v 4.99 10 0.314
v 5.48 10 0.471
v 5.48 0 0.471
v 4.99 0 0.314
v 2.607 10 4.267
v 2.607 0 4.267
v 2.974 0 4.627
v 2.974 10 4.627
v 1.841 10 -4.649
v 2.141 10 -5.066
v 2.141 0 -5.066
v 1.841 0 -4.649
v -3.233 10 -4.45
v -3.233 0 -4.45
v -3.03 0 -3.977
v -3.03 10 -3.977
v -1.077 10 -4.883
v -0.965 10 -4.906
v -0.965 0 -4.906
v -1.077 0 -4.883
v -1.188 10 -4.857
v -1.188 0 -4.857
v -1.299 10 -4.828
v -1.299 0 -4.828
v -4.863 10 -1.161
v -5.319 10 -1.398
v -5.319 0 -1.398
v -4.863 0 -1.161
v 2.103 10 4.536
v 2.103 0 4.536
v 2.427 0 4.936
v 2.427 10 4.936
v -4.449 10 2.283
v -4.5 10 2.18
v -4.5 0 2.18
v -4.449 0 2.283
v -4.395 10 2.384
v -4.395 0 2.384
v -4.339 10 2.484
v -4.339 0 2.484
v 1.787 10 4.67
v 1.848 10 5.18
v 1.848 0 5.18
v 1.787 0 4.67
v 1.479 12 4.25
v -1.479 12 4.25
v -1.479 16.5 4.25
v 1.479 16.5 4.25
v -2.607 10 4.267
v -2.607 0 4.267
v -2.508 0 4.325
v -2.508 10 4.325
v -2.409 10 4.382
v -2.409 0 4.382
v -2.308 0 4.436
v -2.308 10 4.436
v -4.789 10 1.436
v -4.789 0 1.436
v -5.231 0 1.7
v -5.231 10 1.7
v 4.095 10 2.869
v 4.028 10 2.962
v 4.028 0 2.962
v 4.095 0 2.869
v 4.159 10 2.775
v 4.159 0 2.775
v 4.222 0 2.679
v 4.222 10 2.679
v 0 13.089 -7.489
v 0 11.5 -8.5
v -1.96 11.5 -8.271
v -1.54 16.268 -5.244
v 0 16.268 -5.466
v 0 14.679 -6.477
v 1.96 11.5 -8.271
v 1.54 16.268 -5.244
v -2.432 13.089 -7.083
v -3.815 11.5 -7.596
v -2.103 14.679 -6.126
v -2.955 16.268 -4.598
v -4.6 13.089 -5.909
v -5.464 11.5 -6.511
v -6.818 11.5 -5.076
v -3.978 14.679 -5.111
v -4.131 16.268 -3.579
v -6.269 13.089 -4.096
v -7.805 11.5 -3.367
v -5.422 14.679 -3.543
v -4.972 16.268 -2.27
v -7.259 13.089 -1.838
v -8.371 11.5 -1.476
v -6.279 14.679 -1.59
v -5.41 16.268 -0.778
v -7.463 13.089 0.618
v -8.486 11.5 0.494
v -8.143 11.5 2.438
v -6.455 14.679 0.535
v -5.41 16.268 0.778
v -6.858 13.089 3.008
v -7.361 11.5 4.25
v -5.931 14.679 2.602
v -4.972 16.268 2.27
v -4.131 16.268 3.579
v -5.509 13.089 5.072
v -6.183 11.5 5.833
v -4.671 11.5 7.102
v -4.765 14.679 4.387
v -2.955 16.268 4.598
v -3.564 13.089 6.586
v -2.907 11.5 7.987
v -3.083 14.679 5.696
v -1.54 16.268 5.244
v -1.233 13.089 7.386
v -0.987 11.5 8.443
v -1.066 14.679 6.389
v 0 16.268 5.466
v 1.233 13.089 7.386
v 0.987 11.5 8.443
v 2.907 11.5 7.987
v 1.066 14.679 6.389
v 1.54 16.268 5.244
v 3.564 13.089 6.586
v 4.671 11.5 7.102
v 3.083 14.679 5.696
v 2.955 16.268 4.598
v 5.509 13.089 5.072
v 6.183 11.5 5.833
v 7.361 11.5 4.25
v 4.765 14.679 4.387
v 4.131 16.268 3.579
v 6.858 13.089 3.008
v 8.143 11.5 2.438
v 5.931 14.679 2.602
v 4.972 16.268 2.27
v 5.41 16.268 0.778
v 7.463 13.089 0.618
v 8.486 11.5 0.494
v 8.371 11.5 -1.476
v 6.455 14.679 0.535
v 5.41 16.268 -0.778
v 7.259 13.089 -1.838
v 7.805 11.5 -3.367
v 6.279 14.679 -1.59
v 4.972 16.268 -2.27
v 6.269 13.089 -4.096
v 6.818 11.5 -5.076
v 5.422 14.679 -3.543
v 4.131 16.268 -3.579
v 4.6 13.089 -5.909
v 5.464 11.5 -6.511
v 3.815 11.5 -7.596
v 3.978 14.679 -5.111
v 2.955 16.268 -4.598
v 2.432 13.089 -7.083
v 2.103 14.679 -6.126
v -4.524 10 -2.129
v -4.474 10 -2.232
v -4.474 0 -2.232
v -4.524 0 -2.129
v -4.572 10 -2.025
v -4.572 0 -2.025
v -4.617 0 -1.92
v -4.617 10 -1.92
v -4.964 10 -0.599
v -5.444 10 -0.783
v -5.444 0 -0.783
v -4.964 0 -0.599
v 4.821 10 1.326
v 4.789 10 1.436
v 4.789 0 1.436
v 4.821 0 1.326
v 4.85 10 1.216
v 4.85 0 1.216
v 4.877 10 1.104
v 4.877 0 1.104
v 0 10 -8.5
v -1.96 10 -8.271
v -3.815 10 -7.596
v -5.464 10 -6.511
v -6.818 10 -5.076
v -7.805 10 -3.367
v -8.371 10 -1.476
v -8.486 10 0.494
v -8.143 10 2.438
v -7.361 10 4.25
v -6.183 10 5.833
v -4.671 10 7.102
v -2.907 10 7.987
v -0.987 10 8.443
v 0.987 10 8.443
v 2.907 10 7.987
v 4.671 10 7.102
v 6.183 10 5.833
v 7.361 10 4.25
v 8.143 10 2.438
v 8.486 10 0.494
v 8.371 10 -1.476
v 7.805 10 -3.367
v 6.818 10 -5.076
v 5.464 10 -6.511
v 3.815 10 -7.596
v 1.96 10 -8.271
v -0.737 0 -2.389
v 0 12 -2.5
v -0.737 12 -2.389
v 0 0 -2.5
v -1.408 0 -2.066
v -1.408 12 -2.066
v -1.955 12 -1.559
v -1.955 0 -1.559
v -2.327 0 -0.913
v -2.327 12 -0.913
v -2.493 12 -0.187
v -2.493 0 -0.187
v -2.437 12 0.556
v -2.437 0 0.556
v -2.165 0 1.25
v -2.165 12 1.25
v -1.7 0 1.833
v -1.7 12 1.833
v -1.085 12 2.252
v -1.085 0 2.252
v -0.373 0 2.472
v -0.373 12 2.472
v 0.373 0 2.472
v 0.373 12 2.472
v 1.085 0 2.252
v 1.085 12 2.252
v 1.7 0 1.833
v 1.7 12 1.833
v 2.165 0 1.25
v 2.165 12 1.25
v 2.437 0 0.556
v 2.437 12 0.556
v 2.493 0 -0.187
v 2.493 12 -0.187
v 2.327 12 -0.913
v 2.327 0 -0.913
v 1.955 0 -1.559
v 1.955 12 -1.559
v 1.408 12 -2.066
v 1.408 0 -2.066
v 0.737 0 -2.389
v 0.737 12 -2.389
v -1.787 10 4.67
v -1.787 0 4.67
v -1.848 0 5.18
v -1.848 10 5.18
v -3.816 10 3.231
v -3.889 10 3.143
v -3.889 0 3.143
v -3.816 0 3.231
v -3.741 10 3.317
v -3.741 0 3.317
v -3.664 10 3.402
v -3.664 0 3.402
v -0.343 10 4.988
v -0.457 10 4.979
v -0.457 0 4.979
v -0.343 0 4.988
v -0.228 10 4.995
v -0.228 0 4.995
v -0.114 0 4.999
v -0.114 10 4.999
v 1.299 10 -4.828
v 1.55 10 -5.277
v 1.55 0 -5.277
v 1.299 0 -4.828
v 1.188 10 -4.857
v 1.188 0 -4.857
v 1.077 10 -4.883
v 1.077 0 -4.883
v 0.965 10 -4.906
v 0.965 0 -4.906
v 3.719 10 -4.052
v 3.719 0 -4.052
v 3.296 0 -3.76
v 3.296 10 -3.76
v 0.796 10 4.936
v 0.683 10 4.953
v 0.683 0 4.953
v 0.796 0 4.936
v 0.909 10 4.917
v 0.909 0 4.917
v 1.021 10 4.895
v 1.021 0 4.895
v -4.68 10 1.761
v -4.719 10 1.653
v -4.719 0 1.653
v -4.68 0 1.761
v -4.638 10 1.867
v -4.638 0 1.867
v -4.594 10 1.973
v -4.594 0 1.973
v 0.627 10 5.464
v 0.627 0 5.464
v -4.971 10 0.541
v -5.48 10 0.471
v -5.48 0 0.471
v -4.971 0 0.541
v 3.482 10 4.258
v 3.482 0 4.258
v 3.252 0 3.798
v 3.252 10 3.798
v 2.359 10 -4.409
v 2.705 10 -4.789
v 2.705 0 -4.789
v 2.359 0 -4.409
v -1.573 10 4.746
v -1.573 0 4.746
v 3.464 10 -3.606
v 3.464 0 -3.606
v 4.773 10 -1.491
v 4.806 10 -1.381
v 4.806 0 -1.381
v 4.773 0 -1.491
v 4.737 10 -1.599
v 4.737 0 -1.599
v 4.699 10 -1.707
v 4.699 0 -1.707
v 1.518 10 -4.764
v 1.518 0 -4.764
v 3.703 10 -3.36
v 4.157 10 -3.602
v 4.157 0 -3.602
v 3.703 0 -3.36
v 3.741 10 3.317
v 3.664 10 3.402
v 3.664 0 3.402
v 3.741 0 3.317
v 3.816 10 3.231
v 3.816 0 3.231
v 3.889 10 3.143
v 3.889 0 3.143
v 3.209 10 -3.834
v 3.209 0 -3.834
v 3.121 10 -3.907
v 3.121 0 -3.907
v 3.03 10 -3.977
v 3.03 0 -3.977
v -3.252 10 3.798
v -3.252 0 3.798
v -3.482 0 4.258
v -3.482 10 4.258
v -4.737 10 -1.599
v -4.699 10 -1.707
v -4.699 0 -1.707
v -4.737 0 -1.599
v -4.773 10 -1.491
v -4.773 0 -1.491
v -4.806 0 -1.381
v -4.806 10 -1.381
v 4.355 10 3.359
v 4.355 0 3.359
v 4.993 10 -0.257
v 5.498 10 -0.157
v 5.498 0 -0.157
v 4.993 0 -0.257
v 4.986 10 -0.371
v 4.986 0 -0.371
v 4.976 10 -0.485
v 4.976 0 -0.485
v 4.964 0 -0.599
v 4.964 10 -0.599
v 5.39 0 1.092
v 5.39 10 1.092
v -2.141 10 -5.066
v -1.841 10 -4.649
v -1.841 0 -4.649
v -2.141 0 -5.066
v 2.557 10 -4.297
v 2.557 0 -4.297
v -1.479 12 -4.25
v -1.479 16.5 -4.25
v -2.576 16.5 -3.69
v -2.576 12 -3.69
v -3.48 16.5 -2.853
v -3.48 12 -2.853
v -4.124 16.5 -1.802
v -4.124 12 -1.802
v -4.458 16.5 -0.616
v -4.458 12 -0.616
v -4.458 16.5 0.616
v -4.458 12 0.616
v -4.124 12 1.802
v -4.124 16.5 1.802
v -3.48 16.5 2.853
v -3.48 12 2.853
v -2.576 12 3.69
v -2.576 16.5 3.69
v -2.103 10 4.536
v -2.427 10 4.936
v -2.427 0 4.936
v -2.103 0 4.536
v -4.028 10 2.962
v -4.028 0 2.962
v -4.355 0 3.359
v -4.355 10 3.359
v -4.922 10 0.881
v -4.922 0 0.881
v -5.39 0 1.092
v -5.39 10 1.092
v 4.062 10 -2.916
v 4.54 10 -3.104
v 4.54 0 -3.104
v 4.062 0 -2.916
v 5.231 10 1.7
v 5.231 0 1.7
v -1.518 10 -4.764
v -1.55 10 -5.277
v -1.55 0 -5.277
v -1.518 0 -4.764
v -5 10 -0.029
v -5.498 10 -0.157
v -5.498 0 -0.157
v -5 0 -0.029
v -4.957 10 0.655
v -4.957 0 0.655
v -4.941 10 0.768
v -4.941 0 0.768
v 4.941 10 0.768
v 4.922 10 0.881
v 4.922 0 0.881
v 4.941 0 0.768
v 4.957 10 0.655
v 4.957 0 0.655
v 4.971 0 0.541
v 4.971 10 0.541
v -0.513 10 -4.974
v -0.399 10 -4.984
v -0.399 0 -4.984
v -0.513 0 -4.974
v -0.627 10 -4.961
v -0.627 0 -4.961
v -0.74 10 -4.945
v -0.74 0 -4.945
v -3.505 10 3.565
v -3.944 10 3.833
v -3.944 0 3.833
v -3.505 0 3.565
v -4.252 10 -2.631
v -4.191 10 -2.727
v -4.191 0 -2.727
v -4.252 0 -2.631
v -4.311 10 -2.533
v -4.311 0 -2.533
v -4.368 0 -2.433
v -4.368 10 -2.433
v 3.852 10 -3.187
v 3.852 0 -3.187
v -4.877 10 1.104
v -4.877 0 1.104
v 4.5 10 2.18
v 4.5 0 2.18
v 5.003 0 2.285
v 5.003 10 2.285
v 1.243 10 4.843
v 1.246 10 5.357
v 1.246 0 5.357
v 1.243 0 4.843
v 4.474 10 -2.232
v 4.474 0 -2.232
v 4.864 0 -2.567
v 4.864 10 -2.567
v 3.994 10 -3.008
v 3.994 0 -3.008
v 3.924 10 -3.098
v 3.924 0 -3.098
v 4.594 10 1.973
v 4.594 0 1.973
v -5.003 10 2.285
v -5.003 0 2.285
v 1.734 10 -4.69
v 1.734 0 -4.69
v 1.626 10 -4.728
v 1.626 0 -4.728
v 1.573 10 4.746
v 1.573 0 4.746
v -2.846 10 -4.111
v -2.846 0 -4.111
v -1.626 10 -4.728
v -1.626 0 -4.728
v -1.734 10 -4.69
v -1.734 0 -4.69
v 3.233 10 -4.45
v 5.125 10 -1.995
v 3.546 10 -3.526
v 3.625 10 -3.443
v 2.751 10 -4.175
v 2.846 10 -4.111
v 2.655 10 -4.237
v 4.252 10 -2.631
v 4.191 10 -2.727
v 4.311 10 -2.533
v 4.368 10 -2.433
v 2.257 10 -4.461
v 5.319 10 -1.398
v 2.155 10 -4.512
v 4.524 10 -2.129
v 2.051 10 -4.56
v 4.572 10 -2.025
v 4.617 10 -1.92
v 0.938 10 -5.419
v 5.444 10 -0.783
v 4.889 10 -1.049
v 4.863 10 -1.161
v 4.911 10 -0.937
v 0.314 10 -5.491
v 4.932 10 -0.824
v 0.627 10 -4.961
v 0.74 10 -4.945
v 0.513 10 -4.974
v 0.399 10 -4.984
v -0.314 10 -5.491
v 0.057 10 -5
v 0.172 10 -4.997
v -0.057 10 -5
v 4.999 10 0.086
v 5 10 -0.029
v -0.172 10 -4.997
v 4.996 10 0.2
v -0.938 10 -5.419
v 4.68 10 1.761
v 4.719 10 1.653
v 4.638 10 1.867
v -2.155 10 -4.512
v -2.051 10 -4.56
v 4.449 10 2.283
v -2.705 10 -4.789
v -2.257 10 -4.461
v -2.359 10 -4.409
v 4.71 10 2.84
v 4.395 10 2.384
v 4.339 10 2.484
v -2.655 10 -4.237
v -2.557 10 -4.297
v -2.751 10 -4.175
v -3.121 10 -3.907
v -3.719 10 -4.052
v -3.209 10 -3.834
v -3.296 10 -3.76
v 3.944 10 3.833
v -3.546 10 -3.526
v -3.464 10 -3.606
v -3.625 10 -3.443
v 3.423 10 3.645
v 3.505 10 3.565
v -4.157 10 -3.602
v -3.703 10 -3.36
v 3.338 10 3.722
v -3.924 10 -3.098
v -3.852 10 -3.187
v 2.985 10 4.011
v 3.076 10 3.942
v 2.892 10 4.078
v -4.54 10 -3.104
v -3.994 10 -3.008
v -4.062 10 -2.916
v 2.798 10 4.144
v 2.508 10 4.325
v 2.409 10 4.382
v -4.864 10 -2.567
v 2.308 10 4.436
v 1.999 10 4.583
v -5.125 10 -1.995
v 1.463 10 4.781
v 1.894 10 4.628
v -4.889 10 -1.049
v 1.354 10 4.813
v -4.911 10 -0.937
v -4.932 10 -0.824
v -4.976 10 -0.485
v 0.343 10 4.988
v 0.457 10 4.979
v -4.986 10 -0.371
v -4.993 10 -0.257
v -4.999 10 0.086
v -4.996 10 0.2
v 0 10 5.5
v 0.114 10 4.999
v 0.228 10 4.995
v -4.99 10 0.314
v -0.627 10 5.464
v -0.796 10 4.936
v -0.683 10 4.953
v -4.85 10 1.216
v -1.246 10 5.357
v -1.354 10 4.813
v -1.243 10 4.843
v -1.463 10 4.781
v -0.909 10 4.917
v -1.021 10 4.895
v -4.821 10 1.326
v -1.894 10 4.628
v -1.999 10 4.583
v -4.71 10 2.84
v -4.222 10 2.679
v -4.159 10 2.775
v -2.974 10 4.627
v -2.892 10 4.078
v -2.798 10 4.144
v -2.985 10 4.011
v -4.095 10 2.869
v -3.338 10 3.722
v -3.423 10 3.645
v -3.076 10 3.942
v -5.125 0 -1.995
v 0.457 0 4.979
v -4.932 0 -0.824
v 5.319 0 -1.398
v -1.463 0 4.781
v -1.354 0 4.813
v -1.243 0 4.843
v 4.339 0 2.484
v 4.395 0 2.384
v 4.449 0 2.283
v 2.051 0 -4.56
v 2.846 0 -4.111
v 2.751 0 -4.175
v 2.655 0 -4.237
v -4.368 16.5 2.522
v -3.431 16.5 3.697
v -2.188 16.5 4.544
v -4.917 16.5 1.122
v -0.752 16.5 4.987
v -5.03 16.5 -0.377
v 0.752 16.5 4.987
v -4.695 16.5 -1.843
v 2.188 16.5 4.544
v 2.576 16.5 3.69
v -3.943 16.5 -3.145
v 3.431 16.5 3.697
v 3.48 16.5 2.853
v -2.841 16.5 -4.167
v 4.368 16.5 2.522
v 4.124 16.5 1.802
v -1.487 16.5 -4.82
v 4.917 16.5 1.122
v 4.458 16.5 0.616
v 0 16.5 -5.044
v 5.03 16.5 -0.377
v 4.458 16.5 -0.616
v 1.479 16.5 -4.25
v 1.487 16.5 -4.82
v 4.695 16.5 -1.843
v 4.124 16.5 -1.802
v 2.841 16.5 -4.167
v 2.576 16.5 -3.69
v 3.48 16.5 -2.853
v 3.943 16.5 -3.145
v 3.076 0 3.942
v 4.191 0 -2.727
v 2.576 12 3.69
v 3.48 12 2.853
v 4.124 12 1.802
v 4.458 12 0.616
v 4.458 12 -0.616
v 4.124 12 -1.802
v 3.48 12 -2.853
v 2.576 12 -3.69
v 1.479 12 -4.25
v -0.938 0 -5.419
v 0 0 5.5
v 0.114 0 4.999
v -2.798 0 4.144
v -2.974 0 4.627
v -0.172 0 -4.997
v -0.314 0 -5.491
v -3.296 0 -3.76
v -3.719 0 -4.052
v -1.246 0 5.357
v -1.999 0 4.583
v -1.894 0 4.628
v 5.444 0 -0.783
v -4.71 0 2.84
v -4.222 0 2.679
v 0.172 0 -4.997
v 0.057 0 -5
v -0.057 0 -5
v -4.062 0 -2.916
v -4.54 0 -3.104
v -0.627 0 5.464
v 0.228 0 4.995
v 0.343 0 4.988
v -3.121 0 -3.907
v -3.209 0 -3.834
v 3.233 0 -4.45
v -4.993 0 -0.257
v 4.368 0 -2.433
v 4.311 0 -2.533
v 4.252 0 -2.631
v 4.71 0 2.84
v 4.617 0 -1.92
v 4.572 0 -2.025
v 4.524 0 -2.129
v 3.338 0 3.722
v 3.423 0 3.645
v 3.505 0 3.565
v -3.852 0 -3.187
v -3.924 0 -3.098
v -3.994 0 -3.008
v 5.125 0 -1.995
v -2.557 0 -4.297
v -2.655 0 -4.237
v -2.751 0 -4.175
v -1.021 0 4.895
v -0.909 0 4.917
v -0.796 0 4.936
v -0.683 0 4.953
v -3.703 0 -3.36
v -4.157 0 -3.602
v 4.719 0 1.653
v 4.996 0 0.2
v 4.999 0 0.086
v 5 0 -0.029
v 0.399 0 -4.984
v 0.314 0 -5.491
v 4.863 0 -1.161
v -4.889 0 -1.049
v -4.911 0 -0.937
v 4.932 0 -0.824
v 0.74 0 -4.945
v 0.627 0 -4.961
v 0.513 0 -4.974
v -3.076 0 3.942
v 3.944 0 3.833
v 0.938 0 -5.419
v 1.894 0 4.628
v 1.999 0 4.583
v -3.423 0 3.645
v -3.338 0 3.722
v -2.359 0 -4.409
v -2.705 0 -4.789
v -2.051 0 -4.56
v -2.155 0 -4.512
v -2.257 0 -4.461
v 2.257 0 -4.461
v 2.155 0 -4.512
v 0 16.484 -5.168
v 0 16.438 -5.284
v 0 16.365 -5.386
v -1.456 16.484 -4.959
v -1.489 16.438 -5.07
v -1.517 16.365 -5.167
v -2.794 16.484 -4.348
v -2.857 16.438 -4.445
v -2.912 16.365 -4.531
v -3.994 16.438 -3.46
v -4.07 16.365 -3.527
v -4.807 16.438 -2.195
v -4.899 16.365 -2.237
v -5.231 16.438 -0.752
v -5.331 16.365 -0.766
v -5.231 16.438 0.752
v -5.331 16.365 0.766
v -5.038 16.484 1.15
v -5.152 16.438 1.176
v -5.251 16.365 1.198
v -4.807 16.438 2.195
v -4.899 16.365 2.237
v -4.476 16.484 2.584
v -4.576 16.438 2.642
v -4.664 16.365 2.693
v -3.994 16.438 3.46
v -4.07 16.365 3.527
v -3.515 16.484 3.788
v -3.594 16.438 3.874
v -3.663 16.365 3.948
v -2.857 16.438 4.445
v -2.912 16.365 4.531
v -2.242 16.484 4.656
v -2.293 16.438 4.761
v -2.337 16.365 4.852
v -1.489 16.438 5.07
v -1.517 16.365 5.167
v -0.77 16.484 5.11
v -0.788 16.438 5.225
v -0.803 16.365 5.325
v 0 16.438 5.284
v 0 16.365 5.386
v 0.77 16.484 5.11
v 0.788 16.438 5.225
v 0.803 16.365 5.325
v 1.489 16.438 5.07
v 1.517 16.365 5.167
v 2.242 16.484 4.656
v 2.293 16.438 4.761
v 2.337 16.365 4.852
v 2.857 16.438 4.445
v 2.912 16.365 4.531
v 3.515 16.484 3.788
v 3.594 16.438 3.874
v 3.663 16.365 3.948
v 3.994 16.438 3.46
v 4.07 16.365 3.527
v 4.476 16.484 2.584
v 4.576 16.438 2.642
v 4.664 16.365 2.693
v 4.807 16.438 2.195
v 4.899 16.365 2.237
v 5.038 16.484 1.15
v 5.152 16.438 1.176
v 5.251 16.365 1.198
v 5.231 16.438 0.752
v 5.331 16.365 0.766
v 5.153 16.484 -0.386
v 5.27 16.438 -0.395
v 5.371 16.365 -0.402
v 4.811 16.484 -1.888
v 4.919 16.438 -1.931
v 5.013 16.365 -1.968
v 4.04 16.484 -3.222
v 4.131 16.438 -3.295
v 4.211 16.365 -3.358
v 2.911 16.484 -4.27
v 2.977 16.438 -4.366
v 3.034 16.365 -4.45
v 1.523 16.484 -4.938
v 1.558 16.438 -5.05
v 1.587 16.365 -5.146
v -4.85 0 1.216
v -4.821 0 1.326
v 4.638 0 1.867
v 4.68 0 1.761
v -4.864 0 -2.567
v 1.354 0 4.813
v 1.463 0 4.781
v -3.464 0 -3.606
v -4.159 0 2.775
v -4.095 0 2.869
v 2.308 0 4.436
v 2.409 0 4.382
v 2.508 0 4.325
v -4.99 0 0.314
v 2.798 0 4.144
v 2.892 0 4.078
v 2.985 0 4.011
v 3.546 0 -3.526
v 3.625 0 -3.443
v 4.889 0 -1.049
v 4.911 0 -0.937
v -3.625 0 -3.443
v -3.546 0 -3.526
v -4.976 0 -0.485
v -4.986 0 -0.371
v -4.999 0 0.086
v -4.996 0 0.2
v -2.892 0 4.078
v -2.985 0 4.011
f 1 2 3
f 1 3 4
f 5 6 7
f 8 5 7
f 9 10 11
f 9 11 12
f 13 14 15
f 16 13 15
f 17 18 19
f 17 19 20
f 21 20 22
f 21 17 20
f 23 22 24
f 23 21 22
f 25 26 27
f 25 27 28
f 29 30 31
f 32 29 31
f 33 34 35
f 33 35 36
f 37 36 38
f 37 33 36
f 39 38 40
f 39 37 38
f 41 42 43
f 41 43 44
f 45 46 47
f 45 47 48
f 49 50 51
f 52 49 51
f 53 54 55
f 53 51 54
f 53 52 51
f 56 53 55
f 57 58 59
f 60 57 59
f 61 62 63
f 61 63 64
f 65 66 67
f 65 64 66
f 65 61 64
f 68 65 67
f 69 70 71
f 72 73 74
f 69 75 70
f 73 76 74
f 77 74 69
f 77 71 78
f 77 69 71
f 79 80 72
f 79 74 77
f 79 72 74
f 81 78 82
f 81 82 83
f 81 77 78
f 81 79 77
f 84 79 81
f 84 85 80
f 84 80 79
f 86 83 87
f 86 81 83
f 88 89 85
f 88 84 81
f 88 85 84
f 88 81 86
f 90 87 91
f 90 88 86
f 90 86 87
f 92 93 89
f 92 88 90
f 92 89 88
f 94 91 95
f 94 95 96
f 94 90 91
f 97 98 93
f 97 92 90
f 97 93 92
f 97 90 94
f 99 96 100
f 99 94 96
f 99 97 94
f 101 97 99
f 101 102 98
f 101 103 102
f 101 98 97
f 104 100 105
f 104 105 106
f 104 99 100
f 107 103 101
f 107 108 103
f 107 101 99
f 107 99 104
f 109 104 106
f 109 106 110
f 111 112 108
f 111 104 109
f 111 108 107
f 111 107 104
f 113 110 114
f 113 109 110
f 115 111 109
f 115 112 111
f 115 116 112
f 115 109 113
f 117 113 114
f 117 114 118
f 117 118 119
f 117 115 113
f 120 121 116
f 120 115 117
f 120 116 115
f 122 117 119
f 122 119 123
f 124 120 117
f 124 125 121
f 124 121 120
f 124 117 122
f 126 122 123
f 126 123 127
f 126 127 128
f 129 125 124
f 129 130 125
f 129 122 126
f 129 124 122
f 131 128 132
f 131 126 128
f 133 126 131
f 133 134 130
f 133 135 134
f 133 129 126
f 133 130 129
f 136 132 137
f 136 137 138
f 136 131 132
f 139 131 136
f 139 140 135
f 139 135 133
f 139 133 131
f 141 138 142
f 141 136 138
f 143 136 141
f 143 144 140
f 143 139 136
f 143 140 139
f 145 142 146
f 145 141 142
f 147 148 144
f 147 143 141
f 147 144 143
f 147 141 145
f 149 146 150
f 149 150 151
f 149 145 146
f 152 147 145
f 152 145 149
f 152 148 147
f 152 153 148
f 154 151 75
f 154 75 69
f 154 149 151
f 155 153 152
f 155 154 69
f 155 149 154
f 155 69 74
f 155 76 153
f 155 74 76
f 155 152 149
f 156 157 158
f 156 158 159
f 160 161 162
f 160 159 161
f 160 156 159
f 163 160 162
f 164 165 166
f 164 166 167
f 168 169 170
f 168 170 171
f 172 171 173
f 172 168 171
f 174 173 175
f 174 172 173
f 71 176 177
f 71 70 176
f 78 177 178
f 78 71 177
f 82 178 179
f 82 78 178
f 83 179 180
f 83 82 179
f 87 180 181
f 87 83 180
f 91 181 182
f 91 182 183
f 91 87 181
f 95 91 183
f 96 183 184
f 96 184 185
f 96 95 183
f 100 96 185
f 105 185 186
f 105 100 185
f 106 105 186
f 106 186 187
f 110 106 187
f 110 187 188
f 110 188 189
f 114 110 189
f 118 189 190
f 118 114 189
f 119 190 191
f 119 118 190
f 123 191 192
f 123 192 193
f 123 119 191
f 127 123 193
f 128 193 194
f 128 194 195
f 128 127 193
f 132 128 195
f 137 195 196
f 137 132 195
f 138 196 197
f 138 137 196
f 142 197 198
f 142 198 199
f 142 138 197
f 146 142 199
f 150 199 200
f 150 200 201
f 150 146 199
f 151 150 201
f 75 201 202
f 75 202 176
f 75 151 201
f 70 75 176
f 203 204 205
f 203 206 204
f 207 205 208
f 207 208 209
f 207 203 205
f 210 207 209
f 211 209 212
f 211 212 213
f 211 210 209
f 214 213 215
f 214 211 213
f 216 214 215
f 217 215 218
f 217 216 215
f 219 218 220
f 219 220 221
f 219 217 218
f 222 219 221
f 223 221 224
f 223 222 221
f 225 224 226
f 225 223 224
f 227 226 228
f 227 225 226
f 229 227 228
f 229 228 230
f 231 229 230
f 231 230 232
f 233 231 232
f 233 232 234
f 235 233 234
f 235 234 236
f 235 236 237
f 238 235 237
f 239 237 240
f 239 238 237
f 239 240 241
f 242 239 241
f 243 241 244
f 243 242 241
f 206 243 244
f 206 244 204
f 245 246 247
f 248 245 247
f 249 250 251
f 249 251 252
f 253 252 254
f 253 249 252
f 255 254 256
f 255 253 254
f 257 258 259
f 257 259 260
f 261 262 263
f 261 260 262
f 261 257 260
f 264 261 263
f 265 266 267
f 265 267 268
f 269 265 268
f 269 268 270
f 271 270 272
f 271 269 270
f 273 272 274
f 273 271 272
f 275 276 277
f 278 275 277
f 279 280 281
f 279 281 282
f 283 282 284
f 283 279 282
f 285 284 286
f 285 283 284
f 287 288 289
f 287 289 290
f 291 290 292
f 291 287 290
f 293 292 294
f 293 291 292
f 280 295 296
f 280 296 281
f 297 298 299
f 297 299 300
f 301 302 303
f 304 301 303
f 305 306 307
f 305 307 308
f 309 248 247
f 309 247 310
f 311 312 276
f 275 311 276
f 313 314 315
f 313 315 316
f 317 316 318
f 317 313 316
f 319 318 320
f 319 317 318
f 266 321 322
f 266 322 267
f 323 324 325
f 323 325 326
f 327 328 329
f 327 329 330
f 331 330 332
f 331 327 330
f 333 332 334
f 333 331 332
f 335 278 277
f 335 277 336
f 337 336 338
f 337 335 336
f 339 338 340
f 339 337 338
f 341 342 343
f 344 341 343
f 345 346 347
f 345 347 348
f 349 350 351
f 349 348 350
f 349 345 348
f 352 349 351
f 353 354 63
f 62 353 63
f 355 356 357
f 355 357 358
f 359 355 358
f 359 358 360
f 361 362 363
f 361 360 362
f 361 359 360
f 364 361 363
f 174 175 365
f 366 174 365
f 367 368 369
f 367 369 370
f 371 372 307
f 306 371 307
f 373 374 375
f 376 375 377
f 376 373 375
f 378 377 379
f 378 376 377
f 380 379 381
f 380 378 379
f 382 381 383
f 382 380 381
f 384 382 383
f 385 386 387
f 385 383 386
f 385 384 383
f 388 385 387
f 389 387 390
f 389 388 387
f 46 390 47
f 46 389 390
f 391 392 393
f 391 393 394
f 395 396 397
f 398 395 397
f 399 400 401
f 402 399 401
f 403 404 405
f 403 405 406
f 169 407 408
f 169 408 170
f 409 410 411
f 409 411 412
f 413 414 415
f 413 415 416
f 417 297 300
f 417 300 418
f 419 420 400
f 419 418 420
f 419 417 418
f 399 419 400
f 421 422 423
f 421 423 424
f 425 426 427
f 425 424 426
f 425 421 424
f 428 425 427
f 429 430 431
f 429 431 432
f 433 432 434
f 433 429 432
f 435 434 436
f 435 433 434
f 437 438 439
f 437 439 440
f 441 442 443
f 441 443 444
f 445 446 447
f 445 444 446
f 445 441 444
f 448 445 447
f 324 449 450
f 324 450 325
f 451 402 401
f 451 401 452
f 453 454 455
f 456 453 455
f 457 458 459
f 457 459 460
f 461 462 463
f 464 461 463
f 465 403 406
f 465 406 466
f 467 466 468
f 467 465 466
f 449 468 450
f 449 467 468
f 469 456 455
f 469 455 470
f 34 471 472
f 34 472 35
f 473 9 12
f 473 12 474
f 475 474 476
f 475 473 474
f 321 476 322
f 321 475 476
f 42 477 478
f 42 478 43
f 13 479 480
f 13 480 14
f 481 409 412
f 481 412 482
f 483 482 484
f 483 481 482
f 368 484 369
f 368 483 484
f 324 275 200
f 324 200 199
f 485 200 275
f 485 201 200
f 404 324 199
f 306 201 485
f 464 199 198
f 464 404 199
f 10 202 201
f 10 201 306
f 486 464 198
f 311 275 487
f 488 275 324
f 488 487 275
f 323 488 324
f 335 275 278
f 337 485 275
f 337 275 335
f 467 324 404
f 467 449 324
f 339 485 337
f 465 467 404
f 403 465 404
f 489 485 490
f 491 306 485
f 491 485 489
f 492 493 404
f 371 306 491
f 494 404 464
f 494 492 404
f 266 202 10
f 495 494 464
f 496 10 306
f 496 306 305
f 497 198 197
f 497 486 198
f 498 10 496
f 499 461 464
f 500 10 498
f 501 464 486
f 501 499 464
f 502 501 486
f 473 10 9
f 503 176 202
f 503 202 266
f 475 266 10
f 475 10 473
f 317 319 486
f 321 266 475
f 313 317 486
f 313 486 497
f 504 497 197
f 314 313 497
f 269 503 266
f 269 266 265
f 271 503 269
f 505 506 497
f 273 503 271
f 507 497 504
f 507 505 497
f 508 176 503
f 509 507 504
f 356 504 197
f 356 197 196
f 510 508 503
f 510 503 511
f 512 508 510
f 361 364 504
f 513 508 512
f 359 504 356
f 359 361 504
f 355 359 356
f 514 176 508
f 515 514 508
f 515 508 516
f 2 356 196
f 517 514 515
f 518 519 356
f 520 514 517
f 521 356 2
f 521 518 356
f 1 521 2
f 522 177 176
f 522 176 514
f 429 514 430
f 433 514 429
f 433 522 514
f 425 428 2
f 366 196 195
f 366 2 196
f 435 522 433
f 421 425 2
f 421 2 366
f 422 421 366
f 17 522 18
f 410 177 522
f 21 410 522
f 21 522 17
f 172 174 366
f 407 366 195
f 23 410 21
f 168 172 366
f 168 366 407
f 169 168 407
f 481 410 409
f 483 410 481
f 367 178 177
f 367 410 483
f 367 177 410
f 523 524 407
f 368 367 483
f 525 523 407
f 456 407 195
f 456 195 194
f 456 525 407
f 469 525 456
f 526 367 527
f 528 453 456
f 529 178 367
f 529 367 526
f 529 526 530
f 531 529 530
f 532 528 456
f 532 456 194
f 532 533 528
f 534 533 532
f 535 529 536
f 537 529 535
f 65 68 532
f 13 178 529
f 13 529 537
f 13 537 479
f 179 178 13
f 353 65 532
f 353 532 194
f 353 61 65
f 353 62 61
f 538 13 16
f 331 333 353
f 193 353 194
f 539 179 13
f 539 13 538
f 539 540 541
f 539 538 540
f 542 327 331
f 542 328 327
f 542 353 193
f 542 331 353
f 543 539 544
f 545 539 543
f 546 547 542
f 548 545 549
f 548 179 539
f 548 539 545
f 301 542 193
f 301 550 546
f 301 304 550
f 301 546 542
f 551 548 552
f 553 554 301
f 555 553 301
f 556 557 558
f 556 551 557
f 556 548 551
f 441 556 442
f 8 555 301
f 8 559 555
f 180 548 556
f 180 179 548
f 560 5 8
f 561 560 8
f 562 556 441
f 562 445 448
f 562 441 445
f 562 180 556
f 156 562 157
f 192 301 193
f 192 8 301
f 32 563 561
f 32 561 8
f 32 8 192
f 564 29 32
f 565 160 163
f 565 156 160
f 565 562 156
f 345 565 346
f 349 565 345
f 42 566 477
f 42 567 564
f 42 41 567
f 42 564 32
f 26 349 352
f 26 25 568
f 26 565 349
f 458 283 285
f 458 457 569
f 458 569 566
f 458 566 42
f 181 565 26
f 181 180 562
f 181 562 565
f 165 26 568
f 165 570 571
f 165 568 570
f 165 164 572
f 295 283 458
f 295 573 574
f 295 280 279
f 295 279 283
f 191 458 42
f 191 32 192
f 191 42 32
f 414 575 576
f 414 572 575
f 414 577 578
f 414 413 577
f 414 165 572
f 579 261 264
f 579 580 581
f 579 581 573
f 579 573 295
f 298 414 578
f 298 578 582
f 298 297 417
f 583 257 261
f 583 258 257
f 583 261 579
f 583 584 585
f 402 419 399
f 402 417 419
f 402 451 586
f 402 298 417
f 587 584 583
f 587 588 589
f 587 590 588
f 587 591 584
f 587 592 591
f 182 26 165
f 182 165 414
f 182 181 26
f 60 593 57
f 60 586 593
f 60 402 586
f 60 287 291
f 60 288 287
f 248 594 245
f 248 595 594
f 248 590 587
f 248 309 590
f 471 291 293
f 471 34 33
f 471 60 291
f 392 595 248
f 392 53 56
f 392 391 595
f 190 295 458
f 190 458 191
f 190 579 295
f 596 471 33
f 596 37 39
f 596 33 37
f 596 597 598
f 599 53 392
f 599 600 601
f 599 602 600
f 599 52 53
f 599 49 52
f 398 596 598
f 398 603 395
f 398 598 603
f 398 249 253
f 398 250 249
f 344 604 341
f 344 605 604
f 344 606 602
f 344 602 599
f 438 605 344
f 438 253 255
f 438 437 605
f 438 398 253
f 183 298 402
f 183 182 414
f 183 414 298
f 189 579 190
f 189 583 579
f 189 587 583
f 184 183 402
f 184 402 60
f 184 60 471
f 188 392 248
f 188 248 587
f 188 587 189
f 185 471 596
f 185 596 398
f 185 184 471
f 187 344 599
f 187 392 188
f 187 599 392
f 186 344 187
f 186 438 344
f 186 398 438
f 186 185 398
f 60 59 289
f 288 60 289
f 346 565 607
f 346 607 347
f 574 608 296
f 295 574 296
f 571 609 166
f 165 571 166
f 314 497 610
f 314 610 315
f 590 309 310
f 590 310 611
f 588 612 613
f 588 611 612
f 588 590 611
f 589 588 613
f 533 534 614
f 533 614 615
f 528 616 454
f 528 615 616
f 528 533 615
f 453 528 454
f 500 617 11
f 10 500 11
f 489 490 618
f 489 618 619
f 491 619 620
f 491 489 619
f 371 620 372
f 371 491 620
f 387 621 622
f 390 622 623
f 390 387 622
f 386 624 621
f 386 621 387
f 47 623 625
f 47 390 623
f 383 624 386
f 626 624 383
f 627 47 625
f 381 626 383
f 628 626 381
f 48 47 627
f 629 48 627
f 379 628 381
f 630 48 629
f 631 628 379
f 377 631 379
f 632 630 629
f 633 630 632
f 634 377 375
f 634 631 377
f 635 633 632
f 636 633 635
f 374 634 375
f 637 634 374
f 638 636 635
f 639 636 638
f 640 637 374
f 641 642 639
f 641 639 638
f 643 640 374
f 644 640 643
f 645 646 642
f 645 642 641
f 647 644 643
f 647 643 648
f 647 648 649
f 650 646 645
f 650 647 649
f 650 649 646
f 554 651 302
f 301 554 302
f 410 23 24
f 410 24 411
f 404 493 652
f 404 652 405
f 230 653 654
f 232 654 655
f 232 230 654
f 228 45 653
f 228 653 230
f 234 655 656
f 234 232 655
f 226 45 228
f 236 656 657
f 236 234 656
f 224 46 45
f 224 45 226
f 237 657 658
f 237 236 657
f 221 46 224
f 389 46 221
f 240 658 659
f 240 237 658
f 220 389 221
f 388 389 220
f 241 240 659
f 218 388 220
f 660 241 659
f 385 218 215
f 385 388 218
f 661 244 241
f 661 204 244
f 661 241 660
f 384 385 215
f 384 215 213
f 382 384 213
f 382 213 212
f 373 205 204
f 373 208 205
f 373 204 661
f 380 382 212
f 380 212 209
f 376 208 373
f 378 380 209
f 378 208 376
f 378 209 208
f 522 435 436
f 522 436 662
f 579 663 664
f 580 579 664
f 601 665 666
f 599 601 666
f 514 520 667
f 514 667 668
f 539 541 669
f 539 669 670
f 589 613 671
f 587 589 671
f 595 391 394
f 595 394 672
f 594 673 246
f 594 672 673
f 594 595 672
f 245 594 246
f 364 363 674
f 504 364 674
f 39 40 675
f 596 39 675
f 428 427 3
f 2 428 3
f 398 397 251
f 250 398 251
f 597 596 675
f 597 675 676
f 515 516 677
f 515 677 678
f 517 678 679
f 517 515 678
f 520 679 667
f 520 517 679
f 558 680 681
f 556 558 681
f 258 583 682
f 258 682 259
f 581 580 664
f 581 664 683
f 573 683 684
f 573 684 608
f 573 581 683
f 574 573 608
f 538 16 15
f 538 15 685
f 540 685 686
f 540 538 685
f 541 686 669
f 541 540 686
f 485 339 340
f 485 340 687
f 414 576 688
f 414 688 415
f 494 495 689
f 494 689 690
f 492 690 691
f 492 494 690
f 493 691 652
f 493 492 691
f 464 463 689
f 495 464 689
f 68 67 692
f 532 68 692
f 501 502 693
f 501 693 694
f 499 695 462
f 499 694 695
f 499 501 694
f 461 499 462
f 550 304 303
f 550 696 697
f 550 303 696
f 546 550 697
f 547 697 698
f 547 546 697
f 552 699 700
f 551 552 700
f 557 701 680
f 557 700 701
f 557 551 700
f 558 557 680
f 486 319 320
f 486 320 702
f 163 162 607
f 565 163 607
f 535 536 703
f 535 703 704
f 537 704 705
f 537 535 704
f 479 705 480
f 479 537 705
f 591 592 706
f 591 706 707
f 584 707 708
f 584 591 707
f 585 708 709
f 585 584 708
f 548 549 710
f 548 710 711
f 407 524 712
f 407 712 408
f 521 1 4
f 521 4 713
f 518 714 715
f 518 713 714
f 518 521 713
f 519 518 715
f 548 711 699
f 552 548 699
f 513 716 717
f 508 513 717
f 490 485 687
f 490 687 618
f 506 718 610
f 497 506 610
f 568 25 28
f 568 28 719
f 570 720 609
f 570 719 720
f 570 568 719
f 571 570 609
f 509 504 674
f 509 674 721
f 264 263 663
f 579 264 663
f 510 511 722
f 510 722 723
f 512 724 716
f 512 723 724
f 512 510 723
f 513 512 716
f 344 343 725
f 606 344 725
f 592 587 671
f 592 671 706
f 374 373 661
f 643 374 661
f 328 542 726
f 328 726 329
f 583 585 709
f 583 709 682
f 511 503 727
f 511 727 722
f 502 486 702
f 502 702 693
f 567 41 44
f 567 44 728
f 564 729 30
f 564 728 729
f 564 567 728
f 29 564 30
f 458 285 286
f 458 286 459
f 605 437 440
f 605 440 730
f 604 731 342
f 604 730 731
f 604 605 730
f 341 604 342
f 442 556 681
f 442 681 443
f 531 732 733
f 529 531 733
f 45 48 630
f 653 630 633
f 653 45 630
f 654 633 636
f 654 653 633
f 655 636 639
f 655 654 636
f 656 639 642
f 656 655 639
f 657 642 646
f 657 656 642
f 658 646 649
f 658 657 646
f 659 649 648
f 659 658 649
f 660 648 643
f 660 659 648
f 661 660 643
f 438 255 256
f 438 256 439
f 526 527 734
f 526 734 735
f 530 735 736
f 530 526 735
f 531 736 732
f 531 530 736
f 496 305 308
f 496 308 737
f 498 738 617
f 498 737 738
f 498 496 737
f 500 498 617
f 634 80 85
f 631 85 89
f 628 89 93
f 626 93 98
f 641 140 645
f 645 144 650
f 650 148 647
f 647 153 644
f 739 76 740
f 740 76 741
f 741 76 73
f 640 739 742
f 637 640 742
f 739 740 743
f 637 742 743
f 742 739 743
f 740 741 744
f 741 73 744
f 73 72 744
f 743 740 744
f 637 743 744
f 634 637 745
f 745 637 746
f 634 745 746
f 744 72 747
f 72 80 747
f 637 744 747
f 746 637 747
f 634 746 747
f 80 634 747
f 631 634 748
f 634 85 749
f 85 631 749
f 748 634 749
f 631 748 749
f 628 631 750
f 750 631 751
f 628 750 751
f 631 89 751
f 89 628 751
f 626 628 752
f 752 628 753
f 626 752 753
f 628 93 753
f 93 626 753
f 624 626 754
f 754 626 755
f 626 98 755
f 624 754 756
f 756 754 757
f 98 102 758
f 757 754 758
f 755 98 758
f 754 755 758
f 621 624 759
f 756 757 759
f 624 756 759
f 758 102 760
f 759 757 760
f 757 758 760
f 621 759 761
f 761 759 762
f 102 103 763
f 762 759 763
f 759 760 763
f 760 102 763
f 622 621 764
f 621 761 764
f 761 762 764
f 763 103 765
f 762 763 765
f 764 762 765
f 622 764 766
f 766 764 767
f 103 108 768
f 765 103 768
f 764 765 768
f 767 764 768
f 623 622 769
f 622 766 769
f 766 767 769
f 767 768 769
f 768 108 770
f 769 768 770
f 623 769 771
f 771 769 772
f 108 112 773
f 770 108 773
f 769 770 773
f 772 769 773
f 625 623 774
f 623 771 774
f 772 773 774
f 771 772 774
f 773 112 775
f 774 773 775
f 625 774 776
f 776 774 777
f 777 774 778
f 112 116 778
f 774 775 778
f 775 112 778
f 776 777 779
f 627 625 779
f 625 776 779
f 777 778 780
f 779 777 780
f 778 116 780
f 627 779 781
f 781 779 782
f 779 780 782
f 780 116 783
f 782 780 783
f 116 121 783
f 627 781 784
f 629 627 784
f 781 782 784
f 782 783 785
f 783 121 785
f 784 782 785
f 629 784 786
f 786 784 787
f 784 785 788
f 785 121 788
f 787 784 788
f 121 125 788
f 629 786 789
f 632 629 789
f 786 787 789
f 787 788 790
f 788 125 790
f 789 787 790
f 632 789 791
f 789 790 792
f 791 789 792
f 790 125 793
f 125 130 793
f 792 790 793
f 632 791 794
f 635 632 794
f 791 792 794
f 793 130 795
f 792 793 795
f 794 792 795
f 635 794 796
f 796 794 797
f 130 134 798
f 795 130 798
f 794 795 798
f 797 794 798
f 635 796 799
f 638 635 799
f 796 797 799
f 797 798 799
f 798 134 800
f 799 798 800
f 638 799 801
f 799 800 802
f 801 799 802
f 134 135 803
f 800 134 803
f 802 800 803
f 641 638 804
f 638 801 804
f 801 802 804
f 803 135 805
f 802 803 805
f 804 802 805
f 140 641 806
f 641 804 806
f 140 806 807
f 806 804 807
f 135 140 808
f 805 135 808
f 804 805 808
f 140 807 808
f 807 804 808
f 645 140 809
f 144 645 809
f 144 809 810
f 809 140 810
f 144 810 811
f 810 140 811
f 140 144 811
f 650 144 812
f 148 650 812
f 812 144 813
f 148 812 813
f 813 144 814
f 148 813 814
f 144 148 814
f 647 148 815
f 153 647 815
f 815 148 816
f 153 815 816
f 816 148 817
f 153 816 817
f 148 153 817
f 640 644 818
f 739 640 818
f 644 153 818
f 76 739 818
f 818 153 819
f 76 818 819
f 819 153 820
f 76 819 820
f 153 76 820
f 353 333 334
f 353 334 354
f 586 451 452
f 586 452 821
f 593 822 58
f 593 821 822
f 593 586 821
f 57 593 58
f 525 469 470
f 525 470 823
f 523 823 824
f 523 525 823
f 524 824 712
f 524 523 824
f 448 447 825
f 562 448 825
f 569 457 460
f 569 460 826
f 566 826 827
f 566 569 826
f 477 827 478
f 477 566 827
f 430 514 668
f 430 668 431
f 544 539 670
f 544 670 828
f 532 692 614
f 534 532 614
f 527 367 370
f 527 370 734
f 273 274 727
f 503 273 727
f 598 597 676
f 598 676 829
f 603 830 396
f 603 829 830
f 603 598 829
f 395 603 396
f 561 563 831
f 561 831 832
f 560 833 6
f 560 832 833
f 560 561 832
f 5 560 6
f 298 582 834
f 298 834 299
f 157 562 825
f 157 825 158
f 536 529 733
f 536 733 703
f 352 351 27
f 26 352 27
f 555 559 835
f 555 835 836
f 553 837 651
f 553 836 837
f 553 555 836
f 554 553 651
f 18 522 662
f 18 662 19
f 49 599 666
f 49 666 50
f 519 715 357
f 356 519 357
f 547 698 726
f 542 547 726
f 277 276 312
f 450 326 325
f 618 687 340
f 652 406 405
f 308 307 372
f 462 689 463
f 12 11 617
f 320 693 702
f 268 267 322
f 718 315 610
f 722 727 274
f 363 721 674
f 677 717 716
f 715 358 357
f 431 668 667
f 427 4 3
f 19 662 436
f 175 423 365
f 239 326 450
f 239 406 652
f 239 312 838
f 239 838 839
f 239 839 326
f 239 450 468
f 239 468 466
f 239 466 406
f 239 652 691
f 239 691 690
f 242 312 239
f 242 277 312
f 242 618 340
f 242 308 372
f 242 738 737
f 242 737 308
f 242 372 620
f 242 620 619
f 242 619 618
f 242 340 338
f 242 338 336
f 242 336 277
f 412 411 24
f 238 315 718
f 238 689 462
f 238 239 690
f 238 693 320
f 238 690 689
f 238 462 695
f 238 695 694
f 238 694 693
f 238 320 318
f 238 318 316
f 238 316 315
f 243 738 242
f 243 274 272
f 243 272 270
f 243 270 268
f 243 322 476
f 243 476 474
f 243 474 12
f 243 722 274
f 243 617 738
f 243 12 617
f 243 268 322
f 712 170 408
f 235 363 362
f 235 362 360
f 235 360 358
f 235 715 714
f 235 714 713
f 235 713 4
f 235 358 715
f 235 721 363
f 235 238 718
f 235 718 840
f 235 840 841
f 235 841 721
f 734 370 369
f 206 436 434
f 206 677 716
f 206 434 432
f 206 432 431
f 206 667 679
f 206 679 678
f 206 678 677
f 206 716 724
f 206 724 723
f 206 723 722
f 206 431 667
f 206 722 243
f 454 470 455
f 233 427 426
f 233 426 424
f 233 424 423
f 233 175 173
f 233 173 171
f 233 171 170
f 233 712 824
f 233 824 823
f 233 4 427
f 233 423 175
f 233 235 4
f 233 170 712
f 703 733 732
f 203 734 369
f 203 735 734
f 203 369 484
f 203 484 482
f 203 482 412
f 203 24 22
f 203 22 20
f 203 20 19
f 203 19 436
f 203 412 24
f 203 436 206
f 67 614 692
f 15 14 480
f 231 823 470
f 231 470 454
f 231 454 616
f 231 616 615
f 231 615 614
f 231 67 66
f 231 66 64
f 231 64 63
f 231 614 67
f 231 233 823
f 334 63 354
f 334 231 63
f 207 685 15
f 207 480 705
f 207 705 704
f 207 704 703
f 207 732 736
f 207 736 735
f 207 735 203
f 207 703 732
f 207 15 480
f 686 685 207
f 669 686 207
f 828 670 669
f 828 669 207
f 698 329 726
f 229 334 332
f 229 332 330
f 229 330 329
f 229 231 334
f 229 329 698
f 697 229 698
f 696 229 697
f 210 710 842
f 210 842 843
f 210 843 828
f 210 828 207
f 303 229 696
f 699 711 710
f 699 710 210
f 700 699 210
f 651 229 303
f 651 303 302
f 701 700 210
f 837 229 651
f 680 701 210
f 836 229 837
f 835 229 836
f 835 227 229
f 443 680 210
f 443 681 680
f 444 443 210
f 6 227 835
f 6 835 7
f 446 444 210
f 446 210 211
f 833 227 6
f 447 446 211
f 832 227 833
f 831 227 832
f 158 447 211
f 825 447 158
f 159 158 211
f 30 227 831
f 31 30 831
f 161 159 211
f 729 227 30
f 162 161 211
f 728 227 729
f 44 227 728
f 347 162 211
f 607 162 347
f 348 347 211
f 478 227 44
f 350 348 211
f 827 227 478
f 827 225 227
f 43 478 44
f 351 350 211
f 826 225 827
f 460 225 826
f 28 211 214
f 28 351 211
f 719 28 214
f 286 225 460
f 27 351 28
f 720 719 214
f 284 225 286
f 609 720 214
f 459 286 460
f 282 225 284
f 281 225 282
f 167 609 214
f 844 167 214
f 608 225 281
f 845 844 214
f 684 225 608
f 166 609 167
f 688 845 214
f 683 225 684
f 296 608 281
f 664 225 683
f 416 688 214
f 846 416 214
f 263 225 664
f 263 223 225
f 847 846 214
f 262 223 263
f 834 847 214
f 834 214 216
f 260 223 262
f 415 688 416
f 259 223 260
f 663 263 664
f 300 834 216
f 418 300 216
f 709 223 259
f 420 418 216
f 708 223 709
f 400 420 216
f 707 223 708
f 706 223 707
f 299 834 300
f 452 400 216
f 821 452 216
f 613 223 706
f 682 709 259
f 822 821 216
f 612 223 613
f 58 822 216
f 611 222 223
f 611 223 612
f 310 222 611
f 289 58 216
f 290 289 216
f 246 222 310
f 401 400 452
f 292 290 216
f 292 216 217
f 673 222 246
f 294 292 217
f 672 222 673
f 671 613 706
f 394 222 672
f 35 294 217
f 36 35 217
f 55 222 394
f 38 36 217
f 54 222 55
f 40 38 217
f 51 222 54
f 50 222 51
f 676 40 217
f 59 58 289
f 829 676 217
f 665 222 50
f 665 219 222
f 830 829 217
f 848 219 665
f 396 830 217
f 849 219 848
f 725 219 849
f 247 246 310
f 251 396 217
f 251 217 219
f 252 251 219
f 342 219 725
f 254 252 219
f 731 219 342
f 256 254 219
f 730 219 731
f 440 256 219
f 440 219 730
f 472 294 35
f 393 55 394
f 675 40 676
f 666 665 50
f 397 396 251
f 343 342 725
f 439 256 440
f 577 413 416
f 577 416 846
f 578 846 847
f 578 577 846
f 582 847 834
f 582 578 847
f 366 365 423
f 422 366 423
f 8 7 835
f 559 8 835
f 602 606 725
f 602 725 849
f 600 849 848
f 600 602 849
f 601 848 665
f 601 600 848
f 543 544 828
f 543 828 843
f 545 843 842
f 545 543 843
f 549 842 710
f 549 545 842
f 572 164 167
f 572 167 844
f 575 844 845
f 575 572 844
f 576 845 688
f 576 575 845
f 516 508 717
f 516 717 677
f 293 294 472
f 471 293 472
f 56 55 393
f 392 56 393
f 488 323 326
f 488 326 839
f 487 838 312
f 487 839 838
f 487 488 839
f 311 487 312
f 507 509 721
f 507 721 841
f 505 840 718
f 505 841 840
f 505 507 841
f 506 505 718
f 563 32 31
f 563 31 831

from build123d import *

# Parameters (mm, degrees)
EXTRUDE_1_DEPTH          = 10
PATTERN_CIRCULAR_1_COUNT = 55
EXTRUDE_START            = -6
EXTRUDE_2_DEPTH          = 6
SKETCH_4_R               = 7
CUT_EXTRUDE_1_DEPTH      = 0.5
FILLET_2_R               = 0.5


with BuildPart() as part:
    # Эскиз1 → Повернуть1 (revolve)
    with BuildSketch(Plane.XY, mode=Mode.PRIVATE) as revolve_1_sk:
        Polygon((-5, 17), (-4.5, 17), (-4.5, 12), (-2.5, 12), (-2.5, 0), (-5, 0), (-5, 10), (-8.5, 10), (-8.5, 11.5), align=None)
    revolve(revolve_1_sk.sketch.rotate(Axis((0, -50, 0), (0, 1, 0)), 270), axis=Axis((0, -50, 0), (0, 1, 0)))

    # Эскиз2 → Бобышка-Вытянуть1 (add)
    with BuildSketch(Plane.XZ):
        Polygon((-0.25, 4.399667297), (0, 5.5), (0.25, 4.399667297), align=None)
    extrude_1 = extrude(amount=-EXTRUDE_1_DEPTH)

    # Круговой массив1: Бобышка-Вытянуть1 ×55 about axis
    pattern_circular_1_axis = Axis((0, 0, 0), (0, 1, 0))
    for i in range(1, PATTERN_CIRCULAR_1_COUNT):
        add(extrude_1.rotate(pattern_circular_1_axis, i * 360 / PATTERN_CIRCULAR_1_COUNT))

    # Эскиз3 → Бобышка-Вытянуть2 (add)
    with BuildSketch(Plane(origin=(0, 17, 0), x_dir=(1, 0, 0), z_dir=(0, 1, 0)).offset(EXTRUDE_START)):
        with BuildLine():
            Line((-1.479019946, 4.25), (1.479019946, 4.25))
            ThreePointArc((1.479019946, 4.25), (0, 4.5), (-1.479019946, 4.25))
        make_face()
        with BuildLine():
            Line((-1.479019946, -4.25), (1.479019946, -4.25))
            ThreePointArc((1.479019946, -4.25), (0, -4.5), (-1.479019946, -4.25))
        make_face()
    extrude(amount=EXTRUDE_2_DEPTH)

    # Эскиз4 → Вырез-Вытянуть1 (cut)
    with BuildSketch(Plane(origin=(0, 17, 0), x_dir=(1, 0, 0), z_dir=(0, 1, 0))):
        Circle(SKETCH_4_R)
    extrude(amount=-CUT_EXTRUDE_1_DEPTH, mode=Mode.SUBTRACT)

    # Скругление2
    fillet_2_edges = [part.edges().sort_by_distance(p)[0] for p in [
        (0, 16.5, 5.318181818),
    ]]
    fillet(fillet_2_edges, radius=FILLET_2_R)


solid = part.part
